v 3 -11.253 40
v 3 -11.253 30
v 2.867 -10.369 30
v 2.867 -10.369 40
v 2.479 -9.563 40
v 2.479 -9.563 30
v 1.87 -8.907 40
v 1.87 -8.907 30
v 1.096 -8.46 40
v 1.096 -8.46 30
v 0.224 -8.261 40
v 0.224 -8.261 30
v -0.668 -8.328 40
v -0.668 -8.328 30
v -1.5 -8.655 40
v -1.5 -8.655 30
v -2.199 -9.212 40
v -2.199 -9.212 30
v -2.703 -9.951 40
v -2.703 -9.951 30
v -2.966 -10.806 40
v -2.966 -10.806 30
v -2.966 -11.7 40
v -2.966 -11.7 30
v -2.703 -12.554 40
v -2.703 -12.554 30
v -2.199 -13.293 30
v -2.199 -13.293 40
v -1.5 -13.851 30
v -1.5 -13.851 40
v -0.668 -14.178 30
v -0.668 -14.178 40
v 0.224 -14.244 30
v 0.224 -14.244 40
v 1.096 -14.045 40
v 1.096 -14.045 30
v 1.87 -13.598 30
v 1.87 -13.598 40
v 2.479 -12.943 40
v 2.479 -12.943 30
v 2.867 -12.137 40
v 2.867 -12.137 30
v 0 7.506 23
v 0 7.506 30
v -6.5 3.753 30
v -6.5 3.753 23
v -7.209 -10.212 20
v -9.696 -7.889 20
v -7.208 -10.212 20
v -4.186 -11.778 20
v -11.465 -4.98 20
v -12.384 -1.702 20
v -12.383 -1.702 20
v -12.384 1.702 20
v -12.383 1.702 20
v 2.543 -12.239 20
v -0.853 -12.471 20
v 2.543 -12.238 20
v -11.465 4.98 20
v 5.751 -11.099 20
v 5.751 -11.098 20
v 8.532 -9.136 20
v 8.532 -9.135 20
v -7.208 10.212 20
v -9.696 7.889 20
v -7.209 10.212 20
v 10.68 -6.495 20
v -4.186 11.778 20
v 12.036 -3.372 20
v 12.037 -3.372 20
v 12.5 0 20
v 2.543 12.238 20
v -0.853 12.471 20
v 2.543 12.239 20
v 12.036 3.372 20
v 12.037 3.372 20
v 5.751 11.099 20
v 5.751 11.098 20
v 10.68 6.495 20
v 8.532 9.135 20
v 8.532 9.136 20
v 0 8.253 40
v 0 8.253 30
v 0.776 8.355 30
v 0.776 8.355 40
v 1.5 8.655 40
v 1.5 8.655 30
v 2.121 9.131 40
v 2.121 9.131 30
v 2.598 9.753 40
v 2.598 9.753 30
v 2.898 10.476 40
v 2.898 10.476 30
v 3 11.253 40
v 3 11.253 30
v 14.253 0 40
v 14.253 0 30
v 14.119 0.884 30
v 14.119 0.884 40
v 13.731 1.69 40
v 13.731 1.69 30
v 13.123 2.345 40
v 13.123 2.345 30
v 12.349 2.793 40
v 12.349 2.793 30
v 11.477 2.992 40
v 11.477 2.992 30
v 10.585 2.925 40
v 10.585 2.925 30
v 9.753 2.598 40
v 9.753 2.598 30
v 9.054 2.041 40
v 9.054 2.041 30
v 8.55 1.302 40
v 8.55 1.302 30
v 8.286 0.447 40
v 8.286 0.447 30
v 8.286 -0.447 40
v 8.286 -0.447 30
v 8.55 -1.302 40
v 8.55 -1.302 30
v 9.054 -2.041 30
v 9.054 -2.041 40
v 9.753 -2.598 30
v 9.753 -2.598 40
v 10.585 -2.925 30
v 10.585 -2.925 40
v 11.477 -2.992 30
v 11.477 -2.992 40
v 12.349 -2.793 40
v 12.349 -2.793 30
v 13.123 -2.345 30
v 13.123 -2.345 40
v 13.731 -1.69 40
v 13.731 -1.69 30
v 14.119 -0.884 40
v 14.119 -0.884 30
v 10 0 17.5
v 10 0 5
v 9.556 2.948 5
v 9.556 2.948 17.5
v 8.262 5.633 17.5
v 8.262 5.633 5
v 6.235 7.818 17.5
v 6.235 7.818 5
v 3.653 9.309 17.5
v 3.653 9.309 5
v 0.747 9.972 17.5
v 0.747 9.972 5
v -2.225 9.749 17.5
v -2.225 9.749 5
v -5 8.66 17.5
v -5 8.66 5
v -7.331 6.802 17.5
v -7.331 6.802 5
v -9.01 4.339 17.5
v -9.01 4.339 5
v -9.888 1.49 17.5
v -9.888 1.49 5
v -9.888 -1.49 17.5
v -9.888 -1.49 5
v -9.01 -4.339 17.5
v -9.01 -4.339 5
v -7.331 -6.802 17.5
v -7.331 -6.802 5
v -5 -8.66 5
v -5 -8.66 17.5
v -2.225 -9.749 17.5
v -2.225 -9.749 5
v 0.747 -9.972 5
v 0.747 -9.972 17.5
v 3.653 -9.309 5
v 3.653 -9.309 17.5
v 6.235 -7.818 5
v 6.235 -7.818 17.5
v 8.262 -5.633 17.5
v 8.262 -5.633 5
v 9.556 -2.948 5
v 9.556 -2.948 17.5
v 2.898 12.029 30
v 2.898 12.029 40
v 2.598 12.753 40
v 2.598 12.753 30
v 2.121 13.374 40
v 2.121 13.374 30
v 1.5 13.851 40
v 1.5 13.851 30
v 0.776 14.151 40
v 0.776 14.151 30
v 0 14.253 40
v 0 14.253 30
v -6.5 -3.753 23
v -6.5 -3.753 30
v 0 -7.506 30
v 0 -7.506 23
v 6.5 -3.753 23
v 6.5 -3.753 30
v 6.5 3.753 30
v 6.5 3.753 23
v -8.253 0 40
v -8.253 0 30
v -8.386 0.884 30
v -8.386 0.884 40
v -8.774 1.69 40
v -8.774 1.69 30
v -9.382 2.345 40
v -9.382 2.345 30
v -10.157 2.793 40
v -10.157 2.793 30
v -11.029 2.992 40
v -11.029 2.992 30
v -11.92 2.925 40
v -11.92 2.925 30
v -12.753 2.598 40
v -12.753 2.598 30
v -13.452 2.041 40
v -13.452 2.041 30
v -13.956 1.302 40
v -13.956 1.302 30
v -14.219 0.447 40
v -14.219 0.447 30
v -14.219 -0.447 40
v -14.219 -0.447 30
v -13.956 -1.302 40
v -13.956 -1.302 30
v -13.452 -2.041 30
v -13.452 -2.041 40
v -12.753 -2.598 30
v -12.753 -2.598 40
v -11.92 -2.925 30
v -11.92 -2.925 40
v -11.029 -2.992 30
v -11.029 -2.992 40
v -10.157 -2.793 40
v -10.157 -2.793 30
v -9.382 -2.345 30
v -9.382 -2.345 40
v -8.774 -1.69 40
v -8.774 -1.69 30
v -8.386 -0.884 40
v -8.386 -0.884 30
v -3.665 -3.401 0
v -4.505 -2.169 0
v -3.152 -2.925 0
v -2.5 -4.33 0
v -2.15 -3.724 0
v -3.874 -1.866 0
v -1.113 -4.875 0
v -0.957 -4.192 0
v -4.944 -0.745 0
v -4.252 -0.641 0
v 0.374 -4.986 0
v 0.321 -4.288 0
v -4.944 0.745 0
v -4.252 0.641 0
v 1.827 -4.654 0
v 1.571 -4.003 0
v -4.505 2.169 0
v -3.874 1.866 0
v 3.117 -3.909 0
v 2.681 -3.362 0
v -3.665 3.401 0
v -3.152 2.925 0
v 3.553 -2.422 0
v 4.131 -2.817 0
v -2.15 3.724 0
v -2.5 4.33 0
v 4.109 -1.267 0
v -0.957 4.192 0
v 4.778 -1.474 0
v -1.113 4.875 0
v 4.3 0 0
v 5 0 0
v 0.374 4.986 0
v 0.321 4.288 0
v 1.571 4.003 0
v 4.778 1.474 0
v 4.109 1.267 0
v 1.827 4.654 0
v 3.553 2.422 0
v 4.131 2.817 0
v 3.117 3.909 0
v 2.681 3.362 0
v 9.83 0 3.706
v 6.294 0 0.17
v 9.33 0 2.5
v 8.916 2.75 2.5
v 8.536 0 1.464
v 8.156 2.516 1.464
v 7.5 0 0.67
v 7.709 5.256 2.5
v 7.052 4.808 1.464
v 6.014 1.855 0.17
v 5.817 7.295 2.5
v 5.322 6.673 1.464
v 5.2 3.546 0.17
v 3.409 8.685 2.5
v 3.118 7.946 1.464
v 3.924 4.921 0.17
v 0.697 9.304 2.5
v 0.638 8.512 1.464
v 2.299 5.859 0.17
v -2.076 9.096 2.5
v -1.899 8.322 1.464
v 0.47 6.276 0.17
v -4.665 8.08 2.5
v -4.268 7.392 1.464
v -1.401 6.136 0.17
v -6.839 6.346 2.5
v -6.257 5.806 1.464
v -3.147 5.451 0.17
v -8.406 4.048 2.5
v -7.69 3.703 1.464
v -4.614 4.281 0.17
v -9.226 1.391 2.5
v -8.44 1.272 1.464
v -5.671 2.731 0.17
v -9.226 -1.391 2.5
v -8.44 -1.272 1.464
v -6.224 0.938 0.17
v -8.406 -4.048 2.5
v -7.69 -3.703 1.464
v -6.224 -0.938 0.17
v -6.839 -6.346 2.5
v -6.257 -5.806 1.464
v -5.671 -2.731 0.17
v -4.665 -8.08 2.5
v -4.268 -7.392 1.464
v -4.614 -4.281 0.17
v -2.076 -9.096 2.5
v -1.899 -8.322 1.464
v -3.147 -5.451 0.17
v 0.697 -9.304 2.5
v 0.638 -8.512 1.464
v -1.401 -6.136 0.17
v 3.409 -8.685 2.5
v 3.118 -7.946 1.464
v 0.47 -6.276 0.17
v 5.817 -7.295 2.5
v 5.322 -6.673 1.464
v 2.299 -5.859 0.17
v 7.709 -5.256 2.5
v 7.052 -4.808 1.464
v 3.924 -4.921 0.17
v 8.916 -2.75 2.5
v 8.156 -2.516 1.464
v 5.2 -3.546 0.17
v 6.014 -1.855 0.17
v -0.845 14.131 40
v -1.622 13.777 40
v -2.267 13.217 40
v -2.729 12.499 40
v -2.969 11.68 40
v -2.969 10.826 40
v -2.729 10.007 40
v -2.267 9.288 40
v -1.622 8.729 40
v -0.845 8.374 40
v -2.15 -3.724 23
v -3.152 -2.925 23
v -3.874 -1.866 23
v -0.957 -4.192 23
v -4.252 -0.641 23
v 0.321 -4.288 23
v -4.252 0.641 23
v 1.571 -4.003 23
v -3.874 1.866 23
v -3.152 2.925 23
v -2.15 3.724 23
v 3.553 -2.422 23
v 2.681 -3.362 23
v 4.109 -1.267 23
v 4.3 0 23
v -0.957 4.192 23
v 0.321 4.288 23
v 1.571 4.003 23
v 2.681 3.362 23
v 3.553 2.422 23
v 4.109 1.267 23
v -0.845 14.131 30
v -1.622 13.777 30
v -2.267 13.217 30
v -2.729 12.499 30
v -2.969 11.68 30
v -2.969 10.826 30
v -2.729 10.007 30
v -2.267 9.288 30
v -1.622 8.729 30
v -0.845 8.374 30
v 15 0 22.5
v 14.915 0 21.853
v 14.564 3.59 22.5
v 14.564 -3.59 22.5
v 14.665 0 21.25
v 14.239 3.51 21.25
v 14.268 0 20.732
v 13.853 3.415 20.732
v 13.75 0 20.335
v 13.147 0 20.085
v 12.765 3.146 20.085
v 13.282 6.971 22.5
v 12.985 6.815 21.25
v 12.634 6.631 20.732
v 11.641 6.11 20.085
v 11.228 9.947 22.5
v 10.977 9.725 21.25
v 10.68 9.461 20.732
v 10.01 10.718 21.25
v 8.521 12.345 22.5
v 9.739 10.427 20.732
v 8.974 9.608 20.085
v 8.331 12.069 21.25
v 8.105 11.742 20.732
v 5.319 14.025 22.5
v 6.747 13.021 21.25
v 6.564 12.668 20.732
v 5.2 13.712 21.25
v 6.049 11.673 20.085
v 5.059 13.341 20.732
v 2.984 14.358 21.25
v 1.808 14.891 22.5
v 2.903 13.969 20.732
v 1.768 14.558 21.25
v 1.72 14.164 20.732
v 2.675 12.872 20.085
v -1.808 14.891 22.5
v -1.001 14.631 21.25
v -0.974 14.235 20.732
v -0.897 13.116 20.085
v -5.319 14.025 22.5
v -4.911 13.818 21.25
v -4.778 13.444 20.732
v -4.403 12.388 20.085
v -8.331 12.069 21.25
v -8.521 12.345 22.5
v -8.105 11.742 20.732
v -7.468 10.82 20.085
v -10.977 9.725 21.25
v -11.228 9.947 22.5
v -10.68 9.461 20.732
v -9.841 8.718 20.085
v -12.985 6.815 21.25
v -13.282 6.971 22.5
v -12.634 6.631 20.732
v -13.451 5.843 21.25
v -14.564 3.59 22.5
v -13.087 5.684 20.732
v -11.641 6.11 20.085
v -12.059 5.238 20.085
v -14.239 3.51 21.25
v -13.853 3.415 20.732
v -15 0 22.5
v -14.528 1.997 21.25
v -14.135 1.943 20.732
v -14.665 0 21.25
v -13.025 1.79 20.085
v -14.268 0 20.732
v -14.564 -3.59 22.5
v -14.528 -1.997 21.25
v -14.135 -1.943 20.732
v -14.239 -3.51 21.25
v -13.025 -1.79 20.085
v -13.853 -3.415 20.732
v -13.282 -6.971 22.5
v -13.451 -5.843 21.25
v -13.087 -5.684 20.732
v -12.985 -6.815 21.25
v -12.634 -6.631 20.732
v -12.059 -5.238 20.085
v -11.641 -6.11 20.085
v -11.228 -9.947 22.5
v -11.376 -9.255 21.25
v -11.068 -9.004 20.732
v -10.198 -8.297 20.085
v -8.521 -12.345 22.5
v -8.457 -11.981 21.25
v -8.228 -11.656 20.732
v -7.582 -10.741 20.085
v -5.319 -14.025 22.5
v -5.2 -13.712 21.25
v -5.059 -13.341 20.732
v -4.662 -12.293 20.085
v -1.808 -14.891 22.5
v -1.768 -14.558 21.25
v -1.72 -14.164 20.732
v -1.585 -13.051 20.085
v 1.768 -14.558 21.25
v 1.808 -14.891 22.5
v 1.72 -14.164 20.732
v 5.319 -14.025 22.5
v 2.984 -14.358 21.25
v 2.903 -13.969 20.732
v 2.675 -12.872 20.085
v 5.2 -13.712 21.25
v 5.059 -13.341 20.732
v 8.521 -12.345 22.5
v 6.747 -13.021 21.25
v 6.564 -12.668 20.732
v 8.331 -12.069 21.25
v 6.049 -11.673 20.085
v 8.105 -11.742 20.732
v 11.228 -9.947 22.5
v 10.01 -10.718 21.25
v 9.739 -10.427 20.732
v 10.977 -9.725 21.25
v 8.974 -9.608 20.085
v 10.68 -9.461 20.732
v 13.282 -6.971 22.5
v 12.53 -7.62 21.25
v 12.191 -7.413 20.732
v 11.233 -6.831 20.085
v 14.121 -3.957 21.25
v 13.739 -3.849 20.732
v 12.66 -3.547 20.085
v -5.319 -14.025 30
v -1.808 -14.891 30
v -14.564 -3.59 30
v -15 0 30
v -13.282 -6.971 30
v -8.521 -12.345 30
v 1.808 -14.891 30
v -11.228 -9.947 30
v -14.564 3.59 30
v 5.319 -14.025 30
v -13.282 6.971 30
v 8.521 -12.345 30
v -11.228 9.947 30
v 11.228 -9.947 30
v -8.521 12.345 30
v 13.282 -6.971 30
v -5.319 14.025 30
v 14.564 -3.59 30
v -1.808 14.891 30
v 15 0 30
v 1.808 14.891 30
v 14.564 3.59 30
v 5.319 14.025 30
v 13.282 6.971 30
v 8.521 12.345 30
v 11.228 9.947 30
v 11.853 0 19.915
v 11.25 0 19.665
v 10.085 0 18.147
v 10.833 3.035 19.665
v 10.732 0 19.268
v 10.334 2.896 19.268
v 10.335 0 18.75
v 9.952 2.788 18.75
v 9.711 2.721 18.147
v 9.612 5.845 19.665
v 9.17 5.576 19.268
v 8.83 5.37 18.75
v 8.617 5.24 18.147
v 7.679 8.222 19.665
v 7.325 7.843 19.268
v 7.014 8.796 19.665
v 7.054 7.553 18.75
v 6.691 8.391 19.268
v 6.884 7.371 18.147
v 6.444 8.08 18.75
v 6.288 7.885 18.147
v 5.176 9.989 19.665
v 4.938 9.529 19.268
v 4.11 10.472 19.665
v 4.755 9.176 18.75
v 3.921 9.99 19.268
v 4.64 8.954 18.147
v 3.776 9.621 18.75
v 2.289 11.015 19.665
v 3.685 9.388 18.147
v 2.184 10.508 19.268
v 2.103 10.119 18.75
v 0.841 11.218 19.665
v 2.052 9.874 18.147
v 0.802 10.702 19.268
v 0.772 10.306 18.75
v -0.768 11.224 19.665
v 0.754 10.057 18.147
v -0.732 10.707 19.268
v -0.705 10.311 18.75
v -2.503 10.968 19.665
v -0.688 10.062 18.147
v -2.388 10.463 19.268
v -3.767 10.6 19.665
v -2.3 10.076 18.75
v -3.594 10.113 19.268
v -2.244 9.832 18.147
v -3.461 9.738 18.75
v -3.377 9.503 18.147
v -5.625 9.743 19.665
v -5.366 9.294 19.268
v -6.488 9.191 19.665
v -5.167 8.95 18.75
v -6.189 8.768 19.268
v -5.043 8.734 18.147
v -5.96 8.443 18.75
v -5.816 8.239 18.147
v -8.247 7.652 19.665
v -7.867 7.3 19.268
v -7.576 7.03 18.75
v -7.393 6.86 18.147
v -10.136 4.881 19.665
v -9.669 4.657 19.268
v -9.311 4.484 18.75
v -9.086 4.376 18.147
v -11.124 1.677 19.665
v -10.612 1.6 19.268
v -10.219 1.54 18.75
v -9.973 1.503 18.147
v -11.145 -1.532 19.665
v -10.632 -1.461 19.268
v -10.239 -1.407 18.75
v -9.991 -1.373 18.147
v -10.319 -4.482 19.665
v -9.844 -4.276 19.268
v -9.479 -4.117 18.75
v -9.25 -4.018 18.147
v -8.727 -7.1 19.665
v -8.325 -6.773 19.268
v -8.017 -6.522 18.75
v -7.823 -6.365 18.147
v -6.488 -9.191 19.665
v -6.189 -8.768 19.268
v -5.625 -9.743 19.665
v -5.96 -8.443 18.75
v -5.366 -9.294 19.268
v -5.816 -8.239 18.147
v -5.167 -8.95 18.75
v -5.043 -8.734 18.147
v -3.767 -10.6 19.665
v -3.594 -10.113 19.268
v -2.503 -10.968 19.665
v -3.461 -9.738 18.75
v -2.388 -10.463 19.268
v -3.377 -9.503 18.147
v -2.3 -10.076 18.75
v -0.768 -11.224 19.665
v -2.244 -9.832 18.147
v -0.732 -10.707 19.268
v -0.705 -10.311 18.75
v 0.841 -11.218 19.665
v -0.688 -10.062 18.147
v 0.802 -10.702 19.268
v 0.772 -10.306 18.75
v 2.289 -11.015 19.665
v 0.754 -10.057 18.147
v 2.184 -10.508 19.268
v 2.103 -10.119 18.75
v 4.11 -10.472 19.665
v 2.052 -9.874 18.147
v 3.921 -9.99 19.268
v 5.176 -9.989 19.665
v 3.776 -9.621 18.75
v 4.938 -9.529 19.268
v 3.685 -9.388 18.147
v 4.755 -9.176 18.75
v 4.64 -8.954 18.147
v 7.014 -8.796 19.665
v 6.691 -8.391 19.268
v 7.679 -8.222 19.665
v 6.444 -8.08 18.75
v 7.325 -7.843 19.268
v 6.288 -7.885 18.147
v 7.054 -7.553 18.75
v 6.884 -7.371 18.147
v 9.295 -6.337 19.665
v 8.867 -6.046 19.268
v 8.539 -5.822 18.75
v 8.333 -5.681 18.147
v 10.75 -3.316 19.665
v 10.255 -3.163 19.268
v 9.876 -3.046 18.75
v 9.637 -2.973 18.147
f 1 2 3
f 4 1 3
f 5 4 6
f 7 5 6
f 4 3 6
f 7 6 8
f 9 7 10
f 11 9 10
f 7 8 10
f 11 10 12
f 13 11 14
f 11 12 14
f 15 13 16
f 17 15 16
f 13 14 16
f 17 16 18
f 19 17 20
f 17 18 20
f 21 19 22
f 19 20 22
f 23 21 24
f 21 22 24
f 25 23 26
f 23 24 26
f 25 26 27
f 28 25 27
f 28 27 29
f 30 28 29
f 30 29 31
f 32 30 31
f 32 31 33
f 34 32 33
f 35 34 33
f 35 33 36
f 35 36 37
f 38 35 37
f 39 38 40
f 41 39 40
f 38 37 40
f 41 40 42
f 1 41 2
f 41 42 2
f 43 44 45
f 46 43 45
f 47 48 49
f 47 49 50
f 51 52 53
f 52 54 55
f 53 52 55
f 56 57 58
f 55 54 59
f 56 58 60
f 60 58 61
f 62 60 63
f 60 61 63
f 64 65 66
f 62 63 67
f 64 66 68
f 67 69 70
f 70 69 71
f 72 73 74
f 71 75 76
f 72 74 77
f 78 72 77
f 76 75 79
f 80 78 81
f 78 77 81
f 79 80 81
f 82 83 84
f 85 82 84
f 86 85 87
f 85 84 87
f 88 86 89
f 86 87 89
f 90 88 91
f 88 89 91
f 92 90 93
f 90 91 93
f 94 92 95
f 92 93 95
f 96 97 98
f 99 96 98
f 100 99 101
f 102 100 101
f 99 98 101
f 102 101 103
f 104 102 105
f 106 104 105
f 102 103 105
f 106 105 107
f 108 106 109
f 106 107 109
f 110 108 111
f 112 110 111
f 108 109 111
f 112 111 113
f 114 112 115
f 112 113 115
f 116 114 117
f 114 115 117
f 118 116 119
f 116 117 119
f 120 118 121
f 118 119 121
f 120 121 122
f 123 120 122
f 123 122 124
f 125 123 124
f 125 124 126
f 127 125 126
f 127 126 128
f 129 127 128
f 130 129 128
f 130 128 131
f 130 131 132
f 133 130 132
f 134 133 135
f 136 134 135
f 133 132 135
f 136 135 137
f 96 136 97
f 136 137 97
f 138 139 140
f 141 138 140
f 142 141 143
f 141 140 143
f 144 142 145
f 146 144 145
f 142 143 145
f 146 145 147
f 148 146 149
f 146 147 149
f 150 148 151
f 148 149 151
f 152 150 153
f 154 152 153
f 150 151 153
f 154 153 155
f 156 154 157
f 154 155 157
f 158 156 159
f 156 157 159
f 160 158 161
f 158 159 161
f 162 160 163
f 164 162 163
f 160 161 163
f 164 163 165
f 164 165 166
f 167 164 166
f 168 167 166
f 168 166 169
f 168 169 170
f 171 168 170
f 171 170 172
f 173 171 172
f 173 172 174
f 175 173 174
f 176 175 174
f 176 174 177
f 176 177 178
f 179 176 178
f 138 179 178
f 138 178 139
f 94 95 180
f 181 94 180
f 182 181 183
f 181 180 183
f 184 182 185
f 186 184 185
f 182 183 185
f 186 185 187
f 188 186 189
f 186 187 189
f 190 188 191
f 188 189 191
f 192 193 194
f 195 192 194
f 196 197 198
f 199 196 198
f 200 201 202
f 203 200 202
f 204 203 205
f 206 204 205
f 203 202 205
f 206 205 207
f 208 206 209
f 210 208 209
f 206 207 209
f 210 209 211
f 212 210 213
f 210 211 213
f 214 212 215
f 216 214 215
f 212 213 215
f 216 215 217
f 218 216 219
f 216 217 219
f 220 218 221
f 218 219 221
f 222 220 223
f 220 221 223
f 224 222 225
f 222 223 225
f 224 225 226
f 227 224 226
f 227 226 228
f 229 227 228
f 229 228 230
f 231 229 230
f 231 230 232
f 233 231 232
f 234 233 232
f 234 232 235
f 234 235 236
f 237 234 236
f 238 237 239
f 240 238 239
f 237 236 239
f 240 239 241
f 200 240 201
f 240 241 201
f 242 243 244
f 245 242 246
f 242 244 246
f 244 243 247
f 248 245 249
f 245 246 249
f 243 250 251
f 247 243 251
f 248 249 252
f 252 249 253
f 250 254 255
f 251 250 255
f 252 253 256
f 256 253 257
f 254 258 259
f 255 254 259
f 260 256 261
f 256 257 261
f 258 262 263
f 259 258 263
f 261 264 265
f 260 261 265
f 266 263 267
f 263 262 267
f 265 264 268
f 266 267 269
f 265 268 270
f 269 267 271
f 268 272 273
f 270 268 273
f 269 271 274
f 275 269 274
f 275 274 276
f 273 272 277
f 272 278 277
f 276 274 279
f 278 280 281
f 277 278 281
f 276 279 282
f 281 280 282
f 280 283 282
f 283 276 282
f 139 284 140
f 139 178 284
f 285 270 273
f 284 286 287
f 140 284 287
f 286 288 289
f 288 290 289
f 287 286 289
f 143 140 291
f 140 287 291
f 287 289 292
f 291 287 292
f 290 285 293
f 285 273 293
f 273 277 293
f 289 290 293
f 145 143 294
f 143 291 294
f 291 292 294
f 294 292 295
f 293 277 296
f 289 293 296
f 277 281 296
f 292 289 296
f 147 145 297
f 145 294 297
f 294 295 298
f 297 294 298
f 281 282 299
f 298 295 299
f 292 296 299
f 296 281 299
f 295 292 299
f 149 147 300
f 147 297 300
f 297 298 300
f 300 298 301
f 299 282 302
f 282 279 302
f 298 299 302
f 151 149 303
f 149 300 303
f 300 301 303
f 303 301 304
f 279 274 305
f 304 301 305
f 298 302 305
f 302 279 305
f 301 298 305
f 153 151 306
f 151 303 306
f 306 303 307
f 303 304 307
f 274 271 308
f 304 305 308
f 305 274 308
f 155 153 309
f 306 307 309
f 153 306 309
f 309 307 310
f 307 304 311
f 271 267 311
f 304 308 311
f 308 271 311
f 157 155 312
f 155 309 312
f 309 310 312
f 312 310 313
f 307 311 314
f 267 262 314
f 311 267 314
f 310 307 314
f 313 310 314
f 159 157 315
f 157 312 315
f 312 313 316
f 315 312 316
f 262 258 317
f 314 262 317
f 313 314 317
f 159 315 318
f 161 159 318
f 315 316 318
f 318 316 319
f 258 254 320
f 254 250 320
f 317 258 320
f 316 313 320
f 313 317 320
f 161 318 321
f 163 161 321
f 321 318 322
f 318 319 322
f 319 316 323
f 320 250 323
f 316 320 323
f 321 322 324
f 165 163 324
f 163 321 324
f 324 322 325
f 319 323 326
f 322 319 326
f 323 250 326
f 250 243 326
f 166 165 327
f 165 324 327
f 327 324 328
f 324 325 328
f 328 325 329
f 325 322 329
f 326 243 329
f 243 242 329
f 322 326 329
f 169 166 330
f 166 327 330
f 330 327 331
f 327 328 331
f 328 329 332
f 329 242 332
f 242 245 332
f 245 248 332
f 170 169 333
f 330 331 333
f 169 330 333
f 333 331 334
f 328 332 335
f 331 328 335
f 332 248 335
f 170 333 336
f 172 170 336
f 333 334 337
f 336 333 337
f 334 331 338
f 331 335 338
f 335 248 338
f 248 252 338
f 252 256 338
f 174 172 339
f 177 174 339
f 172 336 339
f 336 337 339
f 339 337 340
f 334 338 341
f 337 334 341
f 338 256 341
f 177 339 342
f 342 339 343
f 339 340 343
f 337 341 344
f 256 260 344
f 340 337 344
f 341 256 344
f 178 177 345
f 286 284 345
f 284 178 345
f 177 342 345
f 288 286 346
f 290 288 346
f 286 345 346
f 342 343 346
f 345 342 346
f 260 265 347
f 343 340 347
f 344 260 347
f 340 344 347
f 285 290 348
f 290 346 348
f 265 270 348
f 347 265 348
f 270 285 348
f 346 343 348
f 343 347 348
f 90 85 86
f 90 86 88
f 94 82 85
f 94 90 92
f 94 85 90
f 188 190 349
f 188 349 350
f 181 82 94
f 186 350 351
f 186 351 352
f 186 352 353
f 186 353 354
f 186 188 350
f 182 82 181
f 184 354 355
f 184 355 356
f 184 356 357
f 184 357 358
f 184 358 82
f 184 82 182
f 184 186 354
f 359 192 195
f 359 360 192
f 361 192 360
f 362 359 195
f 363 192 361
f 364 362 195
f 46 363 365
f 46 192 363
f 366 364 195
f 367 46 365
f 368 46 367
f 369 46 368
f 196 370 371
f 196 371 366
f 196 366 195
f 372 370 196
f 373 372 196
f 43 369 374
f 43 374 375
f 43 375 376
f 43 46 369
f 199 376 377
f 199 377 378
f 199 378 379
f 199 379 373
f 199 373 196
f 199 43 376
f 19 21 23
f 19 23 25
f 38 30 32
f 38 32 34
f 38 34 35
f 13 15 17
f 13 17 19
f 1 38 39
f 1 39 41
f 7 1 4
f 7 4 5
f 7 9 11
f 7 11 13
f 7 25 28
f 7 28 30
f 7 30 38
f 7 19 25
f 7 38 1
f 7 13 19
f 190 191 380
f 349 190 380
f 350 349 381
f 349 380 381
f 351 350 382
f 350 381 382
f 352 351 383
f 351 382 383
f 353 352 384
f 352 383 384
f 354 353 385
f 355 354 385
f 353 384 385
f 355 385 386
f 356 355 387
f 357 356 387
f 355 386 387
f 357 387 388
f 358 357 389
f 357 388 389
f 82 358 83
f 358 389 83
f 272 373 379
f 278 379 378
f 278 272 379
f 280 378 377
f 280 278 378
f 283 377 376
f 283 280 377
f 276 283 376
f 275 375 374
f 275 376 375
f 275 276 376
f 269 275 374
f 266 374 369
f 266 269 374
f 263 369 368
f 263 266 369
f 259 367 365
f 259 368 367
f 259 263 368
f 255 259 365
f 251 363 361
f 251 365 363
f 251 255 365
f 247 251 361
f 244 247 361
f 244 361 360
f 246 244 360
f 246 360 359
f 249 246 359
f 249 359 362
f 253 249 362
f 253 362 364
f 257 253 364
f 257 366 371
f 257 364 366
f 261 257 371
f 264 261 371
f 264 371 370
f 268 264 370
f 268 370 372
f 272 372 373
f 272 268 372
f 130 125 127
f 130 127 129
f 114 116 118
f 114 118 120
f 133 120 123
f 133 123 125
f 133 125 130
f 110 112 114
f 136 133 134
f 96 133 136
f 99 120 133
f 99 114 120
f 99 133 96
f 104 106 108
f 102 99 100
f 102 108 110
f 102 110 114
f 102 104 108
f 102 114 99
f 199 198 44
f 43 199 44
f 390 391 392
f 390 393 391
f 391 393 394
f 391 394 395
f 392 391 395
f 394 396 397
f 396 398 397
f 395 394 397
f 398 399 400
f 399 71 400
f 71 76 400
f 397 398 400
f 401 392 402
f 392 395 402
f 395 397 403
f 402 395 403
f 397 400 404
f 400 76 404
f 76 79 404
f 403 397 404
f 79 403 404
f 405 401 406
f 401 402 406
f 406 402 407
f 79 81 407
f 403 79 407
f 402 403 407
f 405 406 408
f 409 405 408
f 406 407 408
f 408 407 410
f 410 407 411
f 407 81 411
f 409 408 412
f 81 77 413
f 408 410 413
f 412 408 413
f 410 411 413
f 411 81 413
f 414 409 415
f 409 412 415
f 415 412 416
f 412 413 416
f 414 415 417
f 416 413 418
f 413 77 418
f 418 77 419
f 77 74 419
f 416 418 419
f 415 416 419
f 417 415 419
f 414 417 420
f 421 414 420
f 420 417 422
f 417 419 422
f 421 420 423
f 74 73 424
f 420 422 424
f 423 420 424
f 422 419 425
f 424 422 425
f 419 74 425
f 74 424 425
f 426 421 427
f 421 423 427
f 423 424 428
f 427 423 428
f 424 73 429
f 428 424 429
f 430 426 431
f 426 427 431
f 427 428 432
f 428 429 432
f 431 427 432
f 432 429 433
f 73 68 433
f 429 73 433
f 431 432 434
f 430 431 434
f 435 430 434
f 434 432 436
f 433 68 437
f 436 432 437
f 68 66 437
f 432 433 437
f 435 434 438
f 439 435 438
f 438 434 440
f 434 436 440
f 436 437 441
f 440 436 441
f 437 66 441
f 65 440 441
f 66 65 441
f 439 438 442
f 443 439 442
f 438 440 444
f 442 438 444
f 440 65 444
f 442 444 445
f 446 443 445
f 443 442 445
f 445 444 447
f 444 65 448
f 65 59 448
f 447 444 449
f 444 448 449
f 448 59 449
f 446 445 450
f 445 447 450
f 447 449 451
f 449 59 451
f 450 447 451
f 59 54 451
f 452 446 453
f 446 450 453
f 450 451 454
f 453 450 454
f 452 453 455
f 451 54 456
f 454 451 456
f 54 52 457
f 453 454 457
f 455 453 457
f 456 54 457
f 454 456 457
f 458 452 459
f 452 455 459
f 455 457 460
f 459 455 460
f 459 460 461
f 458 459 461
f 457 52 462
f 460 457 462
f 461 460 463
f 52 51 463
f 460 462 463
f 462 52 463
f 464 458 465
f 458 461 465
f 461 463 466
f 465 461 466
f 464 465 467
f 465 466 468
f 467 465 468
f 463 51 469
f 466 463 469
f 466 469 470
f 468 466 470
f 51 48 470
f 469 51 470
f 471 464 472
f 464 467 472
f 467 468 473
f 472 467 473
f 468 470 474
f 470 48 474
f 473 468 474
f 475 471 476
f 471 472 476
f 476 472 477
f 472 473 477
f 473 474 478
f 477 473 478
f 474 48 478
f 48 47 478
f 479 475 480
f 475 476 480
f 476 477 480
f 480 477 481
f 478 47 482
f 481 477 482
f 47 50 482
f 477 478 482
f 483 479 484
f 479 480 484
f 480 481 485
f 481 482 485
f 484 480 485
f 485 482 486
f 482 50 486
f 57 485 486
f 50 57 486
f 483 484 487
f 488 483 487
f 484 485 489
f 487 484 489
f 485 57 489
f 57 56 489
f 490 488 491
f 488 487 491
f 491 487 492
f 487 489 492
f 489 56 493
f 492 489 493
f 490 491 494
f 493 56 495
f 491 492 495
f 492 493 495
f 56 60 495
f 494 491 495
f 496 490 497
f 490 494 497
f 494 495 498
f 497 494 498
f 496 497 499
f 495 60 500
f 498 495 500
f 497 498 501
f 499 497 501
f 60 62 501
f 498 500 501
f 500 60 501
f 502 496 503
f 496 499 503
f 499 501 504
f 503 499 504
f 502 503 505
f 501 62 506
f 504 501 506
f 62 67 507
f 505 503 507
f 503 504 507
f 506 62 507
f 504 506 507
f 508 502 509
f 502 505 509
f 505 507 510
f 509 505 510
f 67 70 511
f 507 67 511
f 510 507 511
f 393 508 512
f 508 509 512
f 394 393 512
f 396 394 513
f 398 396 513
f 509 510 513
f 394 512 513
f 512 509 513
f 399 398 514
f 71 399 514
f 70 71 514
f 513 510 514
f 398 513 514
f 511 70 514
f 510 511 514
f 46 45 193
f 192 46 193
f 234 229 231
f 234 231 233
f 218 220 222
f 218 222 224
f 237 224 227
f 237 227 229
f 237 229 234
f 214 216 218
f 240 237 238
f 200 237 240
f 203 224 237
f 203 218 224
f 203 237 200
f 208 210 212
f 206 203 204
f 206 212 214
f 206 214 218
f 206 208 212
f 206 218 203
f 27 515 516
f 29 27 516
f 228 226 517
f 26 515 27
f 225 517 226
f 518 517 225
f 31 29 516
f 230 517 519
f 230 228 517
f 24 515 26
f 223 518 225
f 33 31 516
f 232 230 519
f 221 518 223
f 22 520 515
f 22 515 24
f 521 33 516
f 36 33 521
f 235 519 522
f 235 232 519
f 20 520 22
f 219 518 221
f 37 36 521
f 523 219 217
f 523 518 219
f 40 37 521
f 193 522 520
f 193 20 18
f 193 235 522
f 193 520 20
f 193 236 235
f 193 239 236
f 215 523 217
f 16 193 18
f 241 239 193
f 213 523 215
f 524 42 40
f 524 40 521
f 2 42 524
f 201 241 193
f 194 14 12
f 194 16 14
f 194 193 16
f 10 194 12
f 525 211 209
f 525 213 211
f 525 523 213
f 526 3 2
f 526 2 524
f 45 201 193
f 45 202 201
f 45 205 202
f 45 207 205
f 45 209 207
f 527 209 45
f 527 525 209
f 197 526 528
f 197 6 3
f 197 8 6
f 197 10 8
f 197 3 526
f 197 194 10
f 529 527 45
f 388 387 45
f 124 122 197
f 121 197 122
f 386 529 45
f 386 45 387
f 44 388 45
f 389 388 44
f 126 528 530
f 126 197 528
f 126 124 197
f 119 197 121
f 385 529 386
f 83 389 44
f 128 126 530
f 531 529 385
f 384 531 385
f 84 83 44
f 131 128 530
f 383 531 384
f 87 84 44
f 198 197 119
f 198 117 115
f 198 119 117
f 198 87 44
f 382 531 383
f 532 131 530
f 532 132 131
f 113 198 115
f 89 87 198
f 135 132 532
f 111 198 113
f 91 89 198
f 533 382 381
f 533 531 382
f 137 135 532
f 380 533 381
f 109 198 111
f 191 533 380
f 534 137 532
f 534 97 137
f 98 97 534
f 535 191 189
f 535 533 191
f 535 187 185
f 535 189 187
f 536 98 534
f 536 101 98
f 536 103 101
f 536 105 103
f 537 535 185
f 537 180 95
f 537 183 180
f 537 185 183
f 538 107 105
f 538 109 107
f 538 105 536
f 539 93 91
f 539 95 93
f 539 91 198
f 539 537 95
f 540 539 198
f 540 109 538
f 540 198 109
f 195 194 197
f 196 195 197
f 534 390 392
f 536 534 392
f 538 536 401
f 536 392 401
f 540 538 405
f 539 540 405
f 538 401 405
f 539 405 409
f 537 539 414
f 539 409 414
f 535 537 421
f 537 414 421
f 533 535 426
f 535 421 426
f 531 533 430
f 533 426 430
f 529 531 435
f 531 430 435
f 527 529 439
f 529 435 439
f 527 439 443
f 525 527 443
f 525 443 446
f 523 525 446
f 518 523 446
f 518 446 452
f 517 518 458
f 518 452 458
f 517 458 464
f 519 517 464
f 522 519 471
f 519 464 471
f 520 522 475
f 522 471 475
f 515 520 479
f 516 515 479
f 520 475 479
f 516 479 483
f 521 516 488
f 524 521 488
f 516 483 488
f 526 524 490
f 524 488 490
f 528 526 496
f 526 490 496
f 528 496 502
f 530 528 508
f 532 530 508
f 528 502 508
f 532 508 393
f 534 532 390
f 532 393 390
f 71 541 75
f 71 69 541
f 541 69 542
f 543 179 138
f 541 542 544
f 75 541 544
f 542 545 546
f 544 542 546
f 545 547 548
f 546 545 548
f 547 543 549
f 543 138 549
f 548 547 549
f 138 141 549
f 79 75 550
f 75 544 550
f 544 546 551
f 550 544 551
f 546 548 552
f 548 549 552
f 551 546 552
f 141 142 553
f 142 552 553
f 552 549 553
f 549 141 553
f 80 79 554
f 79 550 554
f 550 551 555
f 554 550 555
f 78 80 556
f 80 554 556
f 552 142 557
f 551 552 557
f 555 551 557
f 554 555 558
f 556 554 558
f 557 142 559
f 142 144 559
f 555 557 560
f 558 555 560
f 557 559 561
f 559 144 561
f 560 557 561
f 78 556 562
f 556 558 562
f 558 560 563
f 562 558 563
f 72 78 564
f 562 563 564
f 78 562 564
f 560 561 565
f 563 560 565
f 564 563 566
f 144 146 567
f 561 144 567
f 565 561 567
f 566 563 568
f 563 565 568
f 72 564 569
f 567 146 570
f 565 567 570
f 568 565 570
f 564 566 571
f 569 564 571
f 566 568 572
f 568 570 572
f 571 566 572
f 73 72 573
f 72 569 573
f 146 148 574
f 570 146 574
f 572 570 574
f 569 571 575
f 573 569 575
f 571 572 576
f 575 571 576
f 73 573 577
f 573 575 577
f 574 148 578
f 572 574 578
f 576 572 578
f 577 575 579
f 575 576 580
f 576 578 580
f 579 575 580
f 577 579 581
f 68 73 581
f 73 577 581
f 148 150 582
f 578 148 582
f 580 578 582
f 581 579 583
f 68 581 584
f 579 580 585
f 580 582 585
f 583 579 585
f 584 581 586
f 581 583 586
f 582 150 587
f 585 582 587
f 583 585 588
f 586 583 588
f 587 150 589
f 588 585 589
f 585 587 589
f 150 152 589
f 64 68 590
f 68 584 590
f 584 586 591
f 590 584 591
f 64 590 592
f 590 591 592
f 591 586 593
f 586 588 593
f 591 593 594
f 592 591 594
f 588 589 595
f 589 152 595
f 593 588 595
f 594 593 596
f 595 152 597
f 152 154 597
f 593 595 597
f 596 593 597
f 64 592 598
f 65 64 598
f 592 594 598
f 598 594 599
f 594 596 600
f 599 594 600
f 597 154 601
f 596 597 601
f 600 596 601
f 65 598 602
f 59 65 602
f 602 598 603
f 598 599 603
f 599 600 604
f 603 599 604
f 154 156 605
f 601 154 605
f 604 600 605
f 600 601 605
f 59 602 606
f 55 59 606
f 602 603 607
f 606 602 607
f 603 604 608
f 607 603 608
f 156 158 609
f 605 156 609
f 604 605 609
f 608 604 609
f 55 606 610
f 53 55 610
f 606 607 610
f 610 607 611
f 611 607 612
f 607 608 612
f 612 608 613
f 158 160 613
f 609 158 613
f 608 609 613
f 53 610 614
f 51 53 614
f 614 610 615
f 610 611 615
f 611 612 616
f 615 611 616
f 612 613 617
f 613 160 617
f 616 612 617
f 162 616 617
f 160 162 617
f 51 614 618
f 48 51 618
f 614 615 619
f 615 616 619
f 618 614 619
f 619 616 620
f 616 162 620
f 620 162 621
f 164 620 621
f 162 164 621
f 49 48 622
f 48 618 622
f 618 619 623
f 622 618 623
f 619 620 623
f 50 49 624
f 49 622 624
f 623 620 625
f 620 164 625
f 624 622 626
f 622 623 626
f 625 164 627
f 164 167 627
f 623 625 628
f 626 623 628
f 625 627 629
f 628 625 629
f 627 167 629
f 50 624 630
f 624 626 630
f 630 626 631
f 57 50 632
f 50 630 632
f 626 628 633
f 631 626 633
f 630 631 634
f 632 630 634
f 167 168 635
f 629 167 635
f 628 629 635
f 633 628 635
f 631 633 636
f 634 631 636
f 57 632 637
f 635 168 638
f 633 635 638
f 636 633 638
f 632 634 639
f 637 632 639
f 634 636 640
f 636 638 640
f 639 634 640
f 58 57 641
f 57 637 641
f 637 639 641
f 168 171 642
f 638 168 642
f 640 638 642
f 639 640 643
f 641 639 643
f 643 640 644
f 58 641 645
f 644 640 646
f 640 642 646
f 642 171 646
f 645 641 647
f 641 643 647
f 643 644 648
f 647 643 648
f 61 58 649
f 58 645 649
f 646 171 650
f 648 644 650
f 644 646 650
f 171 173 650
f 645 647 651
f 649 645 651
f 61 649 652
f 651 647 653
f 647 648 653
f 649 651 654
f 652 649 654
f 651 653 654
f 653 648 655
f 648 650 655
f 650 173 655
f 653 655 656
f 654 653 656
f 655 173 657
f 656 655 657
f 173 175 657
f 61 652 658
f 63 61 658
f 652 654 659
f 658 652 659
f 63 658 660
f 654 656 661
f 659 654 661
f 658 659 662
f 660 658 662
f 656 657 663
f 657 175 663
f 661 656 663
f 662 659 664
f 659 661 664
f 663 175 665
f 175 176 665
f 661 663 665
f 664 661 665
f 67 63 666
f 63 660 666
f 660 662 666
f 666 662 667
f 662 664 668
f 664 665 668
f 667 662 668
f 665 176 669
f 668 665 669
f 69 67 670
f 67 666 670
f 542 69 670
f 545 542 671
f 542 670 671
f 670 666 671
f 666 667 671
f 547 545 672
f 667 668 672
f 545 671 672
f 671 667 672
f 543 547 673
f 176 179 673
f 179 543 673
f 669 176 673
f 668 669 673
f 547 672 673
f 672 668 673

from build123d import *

# Parameters (mm, degrees)
SKETCH1_R           = 10
SKETCH1_R_2         = 4.3
BOSS_EXTRUDE2_DEPTH = 30
CUT_EXTRUDE1_DEPTH  = 7
BOSS_EXTRUDE3_START = -10
SKETCH3_R           = 15
SKETCH3_R_2         = 10
BOSS_EXTRUDE3_DEPTH = 10
FILLET1_R           = 2.5
FILLET2_R           = 5
SKETCH4_R           = 3
BOSS_EXTRUDE4_DEPTH = 10


with BuildPart() as part:
    # Sketch1 → Boss-Extrude2 (new body)
    with BuildSketch(Plane.XY):
        Circle(SKETCH1_R)
        Circle(SKETCH1_R_2, mode=Mode.SUBTRACT)
    extrude(amount=BOSS_EXTRUDE2_DEPTH)

    # Sketch2 → Cut-Extrude1 (cut)
    with BuildSketch(Plane.XY.offset(30)):
        Polygon((0, 7.505553499), (-6.5, 3.75277675), (-6.5, -3.75277675), (0, -7.505553499), (6.5, -3.75277675), (6.5, 3.75277675), align=None)
    extrude(amount=-CUT_EXTRUDE1_DEPTH, mode=Mode.SUBTRACT)

    # Sketch3 → Boss-Extrude3 (add)
    with BuildSketch(Plane.XY.offset(30).offset(BOSS_EXTRUDE3_START)):
        Circle(SKETCH3_R)
        Circle(SKETCH3_R_2, mode=Mode.SUBTRACT)
    extrude(amount=BOSS_EXTRUDE3_DEPTH)

    # Fillet1
    fillet1_edges = [part.edges().sort_by_distance(p)[0] for p in [
        (-10, 0, 20),
        (-15, 0, 20),
    ]]
    fillet(fillet1_edges, radius=FILLET1_R - 0.0001)  # a hair under: the kernel refuses the full size

    # Fillet2
    fillet2_edges = [part.edges().sort_by_distance(p)[0] for p in [
        (-10, 0, 0),
    ]]
    fillet(fillet2_edges, radius=FILLET2_R)

    # Sketch4 → Boss-Extrude4 (add)
    with BuildSketch(Plane.XY.offset(30)):
        with Locations((11.25277675, 0)):
            Circle(SKETCH4_R)
        with BuildLine():
            ThreePointArc((3, 11.25277675), (2.121320344, 13.374097093), (0, 14.25277675))
            Line((0, 14.25277675), (0, 8.25277675))
            ThreePointArc((0, 8.25277675), (2.121320344, 9.131456406), (3, 11.25277675))
        make_face()
        with BuildLine():
            Line((0, 8.25277675), (0, 14.25277675))
            ThreePointArc((0, 14.25277675), (-3, 11.25277675), (0, 8.25277675))
        make_face()
        with Locations((-11.25277675, 0)):
            Circle(SKETCH4_R)
        with Locations((0, -11.25277675)):
            Circle(SKETCH4_R)
    extrude(amount=BOSS_EXTRUDE4_DEPTH)


solid = part.part
